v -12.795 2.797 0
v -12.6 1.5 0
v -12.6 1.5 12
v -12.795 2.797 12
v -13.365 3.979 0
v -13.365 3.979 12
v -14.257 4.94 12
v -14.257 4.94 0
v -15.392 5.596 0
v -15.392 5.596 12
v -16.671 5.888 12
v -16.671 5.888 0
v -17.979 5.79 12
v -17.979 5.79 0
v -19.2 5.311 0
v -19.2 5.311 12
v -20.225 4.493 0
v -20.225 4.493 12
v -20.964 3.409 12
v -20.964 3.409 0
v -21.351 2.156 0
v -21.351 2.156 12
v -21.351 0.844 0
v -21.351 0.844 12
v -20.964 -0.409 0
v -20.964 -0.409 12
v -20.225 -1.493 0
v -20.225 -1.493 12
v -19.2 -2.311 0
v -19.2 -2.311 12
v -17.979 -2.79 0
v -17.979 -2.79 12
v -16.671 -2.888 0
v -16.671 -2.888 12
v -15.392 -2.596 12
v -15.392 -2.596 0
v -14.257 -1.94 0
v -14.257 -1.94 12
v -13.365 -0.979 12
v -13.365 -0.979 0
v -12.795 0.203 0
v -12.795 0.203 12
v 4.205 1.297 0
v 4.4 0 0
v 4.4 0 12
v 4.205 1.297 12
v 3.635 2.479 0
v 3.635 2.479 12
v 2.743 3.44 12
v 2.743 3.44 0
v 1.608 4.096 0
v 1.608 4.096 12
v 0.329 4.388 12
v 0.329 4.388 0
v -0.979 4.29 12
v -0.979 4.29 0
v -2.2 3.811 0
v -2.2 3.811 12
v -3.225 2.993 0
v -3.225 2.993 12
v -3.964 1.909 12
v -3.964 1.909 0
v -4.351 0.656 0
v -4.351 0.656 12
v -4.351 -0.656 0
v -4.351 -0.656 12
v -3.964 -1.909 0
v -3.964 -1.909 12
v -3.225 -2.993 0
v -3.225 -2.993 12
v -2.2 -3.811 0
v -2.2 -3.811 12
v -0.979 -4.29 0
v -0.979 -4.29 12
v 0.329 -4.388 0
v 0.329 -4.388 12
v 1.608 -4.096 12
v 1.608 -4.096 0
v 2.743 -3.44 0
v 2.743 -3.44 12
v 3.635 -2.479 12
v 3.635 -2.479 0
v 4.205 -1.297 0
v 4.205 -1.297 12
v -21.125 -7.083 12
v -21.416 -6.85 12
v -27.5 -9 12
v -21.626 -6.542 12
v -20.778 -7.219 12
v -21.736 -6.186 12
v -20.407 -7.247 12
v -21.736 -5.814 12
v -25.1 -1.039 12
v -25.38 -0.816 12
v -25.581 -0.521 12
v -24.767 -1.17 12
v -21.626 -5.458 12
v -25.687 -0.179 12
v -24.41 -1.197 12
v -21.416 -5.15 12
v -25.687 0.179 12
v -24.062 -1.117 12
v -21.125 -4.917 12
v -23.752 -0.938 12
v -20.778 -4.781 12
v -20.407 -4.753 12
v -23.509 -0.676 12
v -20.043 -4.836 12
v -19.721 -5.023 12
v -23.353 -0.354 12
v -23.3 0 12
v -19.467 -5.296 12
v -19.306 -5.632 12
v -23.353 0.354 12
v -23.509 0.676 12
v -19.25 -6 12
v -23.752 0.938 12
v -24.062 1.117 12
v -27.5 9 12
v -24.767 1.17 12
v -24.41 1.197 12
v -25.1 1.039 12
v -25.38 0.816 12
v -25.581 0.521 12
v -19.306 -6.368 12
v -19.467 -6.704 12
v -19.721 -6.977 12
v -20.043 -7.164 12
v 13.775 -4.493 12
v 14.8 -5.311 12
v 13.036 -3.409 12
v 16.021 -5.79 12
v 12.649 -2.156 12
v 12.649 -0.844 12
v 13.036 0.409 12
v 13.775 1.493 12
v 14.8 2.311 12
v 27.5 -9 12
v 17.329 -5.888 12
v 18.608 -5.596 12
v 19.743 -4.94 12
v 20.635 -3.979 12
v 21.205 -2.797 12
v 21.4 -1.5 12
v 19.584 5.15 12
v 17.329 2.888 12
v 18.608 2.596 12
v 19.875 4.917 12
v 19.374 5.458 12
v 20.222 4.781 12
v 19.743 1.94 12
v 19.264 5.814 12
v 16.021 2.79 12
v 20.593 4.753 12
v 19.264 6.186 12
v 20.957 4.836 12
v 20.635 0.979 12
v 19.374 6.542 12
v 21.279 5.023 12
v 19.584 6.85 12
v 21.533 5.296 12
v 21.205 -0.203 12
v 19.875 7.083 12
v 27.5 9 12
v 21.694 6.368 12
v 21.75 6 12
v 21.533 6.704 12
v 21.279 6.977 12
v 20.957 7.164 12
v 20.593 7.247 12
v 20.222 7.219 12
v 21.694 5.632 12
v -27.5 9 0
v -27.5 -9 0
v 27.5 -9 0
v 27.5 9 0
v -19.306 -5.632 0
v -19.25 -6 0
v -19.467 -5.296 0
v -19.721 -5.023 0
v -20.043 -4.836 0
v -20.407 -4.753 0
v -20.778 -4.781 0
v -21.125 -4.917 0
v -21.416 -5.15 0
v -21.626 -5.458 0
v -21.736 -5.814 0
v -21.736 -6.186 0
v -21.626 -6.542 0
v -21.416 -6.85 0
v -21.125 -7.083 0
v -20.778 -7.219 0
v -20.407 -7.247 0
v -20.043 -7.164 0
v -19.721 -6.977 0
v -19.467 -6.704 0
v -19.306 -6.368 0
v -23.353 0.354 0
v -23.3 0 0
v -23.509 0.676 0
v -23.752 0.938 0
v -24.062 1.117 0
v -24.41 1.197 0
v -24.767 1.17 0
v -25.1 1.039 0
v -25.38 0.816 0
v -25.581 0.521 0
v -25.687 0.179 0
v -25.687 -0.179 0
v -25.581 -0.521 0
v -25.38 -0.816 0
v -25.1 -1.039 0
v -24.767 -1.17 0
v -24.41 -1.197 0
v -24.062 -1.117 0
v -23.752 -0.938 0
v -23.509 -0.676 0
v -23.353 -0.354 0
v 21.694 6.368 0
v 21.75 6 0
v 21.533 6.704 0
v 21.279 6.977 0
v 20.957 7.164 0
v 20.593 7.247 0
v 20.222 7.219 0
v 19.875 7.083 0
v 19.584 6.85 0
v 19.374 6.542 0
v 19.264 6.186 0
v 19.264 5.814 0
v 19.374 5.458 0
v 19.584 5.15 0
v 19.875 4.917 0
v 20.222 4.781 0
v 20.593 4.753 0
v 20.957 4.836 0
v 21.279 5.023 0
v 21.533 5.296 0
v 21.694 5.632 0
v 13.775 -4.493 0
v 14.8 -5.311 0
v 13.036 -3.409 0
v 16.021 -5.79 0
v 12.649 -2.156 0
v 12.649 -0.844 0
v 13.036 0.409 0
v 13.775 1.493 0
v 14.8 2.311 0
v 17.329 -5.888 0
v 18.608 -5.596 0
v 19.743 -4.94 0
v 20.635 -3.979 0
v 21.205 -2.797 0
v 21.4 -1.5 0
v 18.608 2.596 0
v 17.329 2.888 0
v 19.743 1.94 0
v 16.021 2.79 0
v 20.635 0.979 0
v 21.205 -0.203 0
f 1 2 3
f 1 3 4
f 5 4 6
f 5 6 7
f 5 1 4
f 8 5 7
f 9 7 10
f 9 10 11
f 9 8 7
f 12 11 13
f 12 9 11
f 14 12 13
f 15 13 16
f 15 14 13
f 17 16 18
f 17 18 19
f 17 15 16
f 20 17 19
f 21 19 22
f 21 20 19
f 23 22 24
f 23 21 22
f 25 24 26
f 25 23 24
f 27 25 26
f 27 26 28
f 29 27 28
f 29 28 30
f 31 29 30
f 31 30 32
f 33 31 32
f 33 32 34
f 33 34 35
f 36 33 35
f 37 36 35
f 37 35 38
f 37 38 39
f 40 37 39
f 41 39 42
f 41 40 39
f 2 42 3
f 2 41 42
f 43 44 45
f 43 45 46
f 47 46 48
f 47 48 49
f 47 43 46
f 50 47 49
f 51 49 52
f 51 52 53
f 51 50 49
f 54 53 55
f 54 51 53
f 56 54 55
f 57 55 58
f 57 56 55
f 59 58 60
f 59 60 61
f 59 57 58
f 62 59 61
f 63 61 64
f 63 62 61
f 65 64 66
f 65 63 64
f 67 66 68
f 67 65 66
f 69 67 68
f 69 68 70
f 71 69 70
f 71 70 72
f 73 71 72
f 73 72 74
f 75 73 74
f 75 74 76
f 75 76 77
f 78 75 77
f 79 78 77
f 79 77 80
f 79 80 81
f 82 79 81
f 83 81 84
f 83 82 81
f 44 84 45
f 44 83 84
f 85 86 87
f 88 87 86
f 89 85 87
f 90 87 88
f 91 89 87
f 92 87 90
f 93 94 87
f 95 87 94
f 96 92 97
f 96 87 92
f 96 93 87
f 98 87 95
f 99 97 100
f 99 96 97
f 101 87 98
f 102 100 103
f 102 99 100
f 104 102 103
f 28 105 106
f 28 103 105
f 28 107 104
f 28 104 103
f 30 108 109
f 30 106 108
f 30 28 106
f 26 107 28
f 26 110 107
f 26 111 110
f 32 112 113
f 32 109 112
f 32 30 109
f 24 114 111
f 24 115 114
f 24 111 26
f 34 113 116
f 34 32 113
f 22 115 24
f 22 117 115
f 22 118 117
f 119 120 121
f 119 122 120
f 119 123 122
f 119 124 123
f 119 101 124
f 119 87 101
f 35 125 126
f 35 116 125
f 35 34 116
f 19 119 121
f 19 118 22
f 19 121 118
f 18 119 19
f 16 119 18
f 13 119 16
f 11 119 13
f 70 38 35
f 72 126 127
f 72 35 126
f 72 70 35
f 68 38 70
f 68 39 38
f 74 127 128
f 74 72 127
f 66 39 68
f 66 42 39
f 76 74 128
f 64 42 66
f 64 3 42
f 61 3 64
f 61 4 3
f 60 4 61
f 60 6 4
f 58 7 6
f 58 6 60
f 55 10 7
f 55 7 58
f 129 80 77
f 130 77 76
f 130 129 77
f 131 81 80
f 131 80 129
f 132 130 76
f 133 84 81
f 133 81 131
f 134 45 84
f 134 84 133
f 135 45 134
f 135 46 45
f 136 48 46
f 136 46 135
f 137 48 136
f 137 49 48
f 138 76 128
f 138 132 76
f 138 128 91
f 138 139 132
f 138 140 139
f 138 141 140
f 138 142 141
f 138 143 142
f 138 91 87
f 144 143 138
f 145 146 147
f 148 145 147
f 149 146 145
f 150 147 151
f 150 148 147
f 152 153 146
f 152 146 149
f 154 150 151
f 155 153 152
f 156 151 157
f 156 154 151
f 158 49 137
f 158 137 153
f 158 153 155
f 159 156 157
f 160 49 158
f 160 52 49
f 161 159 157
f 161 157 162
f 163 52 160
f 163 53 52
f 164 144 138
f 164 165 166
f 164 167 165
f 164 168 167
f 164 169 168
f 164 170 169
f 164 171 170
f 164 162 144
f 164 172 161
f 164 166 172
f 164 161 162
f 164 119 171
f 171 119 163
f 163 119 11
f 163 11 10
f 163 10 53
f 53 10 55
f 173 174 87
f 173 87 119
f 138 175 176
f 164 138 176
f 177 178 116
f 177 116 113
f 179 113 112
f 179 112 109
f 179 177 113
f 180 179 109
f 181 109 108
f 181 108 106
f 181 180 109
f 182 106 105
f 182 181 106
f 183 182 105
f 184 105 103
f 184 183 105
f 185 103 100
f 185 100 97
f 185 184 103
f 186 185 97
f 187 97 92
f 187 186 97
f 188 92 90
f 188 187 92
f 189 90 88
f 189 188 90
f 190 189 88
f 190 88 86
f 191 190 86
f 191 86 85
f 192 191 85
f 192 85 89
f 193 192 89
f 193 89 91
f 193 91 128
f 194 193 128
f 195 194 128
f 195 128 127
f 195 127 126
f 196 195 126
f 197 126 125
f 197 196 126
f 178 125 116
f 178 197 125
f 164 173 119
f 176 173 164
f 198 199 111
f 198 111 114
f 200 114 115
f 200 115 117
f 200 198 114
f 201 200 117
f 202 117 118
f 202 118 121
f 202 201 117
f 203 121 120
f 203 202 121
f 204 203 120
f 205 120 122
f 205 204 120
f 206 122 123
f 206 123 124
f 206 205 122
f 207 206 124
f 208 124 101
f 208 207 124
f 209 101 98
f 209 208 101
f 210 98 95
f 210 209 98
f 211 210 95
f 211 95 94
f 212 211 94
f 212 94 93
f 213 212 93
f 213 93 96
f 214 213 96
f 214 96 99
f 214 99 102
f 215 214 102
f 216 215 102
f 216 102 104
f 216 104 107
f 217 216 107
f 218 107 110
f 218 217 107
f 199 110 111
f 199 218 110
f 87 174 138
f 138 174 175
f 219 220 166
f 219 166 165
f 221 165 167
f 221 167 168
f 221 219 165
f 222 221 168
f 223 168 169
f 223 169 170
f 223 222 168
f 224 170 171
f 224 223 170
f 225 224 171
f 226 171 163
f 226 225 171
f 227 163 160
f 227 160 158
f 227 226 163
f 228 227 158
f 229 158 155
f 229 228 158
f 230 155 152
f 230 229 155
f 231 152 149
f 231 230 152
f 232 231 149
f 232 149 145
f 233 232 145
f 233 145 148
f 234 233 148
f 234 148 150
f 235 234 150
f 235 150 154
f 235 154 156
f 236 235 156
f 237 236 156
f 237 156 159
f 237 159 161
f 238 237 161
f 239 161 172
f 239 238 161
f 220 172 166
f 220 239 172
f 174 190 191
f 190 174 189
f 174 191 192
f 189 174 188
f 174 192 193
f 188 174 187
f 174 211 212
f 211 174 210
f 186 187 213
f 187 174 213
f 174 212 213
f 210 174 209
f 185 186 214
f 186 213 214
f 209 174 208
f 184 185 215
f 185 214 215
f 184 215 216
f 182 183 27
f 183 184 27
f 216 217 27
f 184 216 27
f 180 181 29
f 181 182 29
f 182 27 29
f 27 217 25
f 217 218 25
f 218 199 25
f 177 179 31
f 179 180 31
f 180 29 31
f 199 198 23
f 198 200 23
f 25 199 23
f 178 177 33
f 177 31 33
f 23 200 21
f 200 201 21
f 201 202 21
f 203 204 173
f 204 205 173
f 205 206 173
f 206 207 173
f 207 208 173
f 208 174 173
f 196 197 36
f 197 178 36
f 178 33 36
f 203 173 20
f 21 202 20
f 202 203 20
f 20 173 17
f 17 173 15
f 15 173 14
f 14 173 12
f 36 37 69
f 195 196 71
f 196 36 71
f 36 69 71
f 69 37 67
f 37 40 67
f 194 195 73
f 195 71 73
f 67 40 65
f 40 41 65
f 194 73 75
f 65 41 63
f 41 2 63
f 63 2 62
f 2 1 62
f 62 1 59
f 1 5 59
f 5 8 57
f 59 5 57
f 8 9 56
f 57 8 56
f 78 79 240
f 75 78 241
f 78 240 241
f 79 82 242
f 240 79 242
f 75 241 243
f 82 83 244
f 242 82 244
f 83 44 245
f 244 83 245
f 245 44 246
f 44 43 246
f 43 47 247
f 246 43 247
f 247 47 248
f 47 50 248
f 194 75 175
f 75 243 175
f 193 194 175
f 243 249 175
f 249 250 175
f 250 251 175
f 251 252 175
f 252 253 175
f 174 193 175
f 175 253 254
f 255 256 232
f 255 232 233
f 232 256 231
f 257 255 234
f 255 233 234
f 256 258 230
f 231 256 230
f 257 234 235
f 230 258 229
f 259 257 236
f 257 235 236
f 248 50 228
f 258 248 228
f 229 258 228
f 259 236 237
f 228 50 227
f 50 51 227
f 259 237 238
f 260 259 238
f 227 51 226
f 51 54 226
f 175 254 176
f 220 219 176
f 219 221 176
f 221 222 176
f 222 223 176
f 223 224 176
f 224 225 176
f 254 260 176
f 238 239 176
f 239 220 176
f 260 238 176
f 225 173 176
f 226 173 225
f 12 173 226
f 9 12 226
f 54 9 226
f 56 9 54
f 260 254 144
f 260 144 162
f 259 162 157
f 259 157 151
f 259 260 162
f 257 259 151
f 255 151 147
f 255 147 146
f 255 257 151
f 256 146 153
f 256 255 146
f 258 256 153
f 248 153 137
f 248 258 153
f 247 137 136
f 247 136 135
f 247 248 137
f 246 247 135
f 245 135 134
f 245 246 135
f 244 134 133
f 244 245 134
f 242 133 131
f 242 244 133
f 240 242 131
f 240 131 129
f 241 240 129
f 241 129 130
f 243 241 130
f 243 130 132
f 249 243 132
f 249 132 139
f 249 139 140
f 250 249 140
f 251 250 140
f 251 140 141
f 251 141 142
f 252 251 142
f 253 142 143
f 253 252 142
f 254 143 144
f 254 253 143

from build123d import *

# Parameters (mm, degrees)
F0_W     = 55
F0_H     = 18
F0_R     = 1.25
F0_R_2   = 4.4
F0_R_3   = 1.2
F1_DEPTH = 12


with BuildPart() as f1:
    # F0 (on Top) → F1 (new body)
    with BuildSketch(Plane.XY):
        Rectangle(F0_W, F0_H)
        with Locations((-20.5, -6)):
            Circle(F0_R, mode=Mode.SUBTRACT)
        with Locations((17, -1.5)):
            Circle(F0_R_2, mode=Mode.SUBTRACT)
        with Locations((-24.5, 0)):
            Circle(F0_R_3, mode=Mode.SUBTRACT)
        with Locations((-17, 1.5)):
            Circle(F0_R_2, mode=Mode.SUBTRACT)
        Circle(F0_R_2, mode=Mode.SUBTRACT)
        with Locations((20.5, 6)):
            Circle(F0_R, mode=Mode.SUBTRACT)
    extrude(amount=F1_DEPTH)


solid = f1.part
